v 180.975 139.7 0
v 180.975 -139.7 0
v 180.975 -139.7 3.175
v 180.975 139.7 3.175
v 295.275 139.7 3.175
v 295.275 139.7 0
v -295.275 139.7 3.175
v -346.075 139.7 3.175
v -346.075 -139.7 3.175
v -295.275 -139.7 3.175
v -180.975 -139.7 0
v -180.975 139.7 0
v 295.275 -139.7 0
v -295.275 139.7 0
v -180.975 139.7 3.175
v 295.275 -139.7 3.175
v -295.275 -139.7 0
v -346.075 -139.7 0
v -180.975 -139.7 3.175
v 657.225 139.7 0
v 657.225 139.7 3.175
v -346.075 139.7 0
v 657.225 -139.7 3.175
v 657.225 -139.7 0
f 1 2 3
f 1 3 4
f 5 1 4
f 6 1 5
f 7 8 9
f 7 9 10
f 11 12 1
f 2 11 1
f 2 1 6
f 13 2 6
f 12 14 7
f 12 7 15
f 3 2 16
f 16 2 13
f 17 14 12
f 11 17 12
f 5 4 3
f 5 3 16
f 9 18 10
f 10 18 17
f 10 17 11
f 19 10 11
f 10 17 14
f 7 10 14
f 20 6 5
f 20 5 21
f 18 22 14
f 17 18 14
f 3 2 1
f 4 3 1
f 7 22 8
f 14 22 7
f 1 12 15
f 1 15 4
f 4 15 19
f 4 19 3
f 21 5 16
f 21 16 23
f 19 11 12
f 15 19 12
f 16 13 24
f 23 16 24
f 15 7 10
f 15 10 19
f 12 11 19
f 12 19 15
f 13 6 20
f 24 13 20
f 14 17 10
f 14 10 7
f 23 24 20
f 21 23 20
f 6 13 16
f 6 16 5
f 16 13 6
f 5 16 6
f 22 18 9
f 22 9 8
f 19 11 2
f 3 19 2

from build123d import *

# Parameters (mm, degrees)
F0_W     = 361.95
F0_H     = 279.4
F1_DEPTH = 3.175
F0_W_2   = 114.3
F2_DEPTH = 3.175
F3_DEPTH = 3.175
F4_DEPTH = 3.175
F0_W_3   = 50.8
F5_DEPTH = 3.175


with BuildPart() as f1:
    # F0 (on Top) → F1 (new body)
    with BuildSketch(Plane.XY):
        Rectangle(F0_W, F0_H)
    extrude(amount=F1_DEPTH)


with BuildPart() as f2:
    # F0 (on Top) → F2 (new body)
    with BuildSketch(Plane.XY):
        with Locations((-238.125, 0)):
            Rectangle(F0_W_2, F0_H)
    extrude(amount=F2_DEPTH)


with BuildPart() as f3:
    # F0 (on Top) → F3 (new body)
    with BuildSketch(Plane.XY):
        with Locations((238.125, 0)):
            Rectangle(F0_W_2, F0_H)
    extrude(amount=F3_DEPTH)


with BuildPart() as f4:
    # F0 (on Top) → F4 (new body)
    with BuildSketch(Plane.XY):
        with Locations((476.25, 0)):
            Rectangle(F0_W, F0_H)
    extrude(amount=F4_DEPTH)


with BuildPart() as f5:
    # F0 (on Top) → F5 (new body)
    with BuildSketch(Plane.XY):
        with Locations((-320.675, 0)):
            Rectangle(F0_W_3, F0_H)
    extrude(amount=F5_DEPTH)


solid = Compound([f1.part, f2.part, f3.part, f4.part, f5.part])
